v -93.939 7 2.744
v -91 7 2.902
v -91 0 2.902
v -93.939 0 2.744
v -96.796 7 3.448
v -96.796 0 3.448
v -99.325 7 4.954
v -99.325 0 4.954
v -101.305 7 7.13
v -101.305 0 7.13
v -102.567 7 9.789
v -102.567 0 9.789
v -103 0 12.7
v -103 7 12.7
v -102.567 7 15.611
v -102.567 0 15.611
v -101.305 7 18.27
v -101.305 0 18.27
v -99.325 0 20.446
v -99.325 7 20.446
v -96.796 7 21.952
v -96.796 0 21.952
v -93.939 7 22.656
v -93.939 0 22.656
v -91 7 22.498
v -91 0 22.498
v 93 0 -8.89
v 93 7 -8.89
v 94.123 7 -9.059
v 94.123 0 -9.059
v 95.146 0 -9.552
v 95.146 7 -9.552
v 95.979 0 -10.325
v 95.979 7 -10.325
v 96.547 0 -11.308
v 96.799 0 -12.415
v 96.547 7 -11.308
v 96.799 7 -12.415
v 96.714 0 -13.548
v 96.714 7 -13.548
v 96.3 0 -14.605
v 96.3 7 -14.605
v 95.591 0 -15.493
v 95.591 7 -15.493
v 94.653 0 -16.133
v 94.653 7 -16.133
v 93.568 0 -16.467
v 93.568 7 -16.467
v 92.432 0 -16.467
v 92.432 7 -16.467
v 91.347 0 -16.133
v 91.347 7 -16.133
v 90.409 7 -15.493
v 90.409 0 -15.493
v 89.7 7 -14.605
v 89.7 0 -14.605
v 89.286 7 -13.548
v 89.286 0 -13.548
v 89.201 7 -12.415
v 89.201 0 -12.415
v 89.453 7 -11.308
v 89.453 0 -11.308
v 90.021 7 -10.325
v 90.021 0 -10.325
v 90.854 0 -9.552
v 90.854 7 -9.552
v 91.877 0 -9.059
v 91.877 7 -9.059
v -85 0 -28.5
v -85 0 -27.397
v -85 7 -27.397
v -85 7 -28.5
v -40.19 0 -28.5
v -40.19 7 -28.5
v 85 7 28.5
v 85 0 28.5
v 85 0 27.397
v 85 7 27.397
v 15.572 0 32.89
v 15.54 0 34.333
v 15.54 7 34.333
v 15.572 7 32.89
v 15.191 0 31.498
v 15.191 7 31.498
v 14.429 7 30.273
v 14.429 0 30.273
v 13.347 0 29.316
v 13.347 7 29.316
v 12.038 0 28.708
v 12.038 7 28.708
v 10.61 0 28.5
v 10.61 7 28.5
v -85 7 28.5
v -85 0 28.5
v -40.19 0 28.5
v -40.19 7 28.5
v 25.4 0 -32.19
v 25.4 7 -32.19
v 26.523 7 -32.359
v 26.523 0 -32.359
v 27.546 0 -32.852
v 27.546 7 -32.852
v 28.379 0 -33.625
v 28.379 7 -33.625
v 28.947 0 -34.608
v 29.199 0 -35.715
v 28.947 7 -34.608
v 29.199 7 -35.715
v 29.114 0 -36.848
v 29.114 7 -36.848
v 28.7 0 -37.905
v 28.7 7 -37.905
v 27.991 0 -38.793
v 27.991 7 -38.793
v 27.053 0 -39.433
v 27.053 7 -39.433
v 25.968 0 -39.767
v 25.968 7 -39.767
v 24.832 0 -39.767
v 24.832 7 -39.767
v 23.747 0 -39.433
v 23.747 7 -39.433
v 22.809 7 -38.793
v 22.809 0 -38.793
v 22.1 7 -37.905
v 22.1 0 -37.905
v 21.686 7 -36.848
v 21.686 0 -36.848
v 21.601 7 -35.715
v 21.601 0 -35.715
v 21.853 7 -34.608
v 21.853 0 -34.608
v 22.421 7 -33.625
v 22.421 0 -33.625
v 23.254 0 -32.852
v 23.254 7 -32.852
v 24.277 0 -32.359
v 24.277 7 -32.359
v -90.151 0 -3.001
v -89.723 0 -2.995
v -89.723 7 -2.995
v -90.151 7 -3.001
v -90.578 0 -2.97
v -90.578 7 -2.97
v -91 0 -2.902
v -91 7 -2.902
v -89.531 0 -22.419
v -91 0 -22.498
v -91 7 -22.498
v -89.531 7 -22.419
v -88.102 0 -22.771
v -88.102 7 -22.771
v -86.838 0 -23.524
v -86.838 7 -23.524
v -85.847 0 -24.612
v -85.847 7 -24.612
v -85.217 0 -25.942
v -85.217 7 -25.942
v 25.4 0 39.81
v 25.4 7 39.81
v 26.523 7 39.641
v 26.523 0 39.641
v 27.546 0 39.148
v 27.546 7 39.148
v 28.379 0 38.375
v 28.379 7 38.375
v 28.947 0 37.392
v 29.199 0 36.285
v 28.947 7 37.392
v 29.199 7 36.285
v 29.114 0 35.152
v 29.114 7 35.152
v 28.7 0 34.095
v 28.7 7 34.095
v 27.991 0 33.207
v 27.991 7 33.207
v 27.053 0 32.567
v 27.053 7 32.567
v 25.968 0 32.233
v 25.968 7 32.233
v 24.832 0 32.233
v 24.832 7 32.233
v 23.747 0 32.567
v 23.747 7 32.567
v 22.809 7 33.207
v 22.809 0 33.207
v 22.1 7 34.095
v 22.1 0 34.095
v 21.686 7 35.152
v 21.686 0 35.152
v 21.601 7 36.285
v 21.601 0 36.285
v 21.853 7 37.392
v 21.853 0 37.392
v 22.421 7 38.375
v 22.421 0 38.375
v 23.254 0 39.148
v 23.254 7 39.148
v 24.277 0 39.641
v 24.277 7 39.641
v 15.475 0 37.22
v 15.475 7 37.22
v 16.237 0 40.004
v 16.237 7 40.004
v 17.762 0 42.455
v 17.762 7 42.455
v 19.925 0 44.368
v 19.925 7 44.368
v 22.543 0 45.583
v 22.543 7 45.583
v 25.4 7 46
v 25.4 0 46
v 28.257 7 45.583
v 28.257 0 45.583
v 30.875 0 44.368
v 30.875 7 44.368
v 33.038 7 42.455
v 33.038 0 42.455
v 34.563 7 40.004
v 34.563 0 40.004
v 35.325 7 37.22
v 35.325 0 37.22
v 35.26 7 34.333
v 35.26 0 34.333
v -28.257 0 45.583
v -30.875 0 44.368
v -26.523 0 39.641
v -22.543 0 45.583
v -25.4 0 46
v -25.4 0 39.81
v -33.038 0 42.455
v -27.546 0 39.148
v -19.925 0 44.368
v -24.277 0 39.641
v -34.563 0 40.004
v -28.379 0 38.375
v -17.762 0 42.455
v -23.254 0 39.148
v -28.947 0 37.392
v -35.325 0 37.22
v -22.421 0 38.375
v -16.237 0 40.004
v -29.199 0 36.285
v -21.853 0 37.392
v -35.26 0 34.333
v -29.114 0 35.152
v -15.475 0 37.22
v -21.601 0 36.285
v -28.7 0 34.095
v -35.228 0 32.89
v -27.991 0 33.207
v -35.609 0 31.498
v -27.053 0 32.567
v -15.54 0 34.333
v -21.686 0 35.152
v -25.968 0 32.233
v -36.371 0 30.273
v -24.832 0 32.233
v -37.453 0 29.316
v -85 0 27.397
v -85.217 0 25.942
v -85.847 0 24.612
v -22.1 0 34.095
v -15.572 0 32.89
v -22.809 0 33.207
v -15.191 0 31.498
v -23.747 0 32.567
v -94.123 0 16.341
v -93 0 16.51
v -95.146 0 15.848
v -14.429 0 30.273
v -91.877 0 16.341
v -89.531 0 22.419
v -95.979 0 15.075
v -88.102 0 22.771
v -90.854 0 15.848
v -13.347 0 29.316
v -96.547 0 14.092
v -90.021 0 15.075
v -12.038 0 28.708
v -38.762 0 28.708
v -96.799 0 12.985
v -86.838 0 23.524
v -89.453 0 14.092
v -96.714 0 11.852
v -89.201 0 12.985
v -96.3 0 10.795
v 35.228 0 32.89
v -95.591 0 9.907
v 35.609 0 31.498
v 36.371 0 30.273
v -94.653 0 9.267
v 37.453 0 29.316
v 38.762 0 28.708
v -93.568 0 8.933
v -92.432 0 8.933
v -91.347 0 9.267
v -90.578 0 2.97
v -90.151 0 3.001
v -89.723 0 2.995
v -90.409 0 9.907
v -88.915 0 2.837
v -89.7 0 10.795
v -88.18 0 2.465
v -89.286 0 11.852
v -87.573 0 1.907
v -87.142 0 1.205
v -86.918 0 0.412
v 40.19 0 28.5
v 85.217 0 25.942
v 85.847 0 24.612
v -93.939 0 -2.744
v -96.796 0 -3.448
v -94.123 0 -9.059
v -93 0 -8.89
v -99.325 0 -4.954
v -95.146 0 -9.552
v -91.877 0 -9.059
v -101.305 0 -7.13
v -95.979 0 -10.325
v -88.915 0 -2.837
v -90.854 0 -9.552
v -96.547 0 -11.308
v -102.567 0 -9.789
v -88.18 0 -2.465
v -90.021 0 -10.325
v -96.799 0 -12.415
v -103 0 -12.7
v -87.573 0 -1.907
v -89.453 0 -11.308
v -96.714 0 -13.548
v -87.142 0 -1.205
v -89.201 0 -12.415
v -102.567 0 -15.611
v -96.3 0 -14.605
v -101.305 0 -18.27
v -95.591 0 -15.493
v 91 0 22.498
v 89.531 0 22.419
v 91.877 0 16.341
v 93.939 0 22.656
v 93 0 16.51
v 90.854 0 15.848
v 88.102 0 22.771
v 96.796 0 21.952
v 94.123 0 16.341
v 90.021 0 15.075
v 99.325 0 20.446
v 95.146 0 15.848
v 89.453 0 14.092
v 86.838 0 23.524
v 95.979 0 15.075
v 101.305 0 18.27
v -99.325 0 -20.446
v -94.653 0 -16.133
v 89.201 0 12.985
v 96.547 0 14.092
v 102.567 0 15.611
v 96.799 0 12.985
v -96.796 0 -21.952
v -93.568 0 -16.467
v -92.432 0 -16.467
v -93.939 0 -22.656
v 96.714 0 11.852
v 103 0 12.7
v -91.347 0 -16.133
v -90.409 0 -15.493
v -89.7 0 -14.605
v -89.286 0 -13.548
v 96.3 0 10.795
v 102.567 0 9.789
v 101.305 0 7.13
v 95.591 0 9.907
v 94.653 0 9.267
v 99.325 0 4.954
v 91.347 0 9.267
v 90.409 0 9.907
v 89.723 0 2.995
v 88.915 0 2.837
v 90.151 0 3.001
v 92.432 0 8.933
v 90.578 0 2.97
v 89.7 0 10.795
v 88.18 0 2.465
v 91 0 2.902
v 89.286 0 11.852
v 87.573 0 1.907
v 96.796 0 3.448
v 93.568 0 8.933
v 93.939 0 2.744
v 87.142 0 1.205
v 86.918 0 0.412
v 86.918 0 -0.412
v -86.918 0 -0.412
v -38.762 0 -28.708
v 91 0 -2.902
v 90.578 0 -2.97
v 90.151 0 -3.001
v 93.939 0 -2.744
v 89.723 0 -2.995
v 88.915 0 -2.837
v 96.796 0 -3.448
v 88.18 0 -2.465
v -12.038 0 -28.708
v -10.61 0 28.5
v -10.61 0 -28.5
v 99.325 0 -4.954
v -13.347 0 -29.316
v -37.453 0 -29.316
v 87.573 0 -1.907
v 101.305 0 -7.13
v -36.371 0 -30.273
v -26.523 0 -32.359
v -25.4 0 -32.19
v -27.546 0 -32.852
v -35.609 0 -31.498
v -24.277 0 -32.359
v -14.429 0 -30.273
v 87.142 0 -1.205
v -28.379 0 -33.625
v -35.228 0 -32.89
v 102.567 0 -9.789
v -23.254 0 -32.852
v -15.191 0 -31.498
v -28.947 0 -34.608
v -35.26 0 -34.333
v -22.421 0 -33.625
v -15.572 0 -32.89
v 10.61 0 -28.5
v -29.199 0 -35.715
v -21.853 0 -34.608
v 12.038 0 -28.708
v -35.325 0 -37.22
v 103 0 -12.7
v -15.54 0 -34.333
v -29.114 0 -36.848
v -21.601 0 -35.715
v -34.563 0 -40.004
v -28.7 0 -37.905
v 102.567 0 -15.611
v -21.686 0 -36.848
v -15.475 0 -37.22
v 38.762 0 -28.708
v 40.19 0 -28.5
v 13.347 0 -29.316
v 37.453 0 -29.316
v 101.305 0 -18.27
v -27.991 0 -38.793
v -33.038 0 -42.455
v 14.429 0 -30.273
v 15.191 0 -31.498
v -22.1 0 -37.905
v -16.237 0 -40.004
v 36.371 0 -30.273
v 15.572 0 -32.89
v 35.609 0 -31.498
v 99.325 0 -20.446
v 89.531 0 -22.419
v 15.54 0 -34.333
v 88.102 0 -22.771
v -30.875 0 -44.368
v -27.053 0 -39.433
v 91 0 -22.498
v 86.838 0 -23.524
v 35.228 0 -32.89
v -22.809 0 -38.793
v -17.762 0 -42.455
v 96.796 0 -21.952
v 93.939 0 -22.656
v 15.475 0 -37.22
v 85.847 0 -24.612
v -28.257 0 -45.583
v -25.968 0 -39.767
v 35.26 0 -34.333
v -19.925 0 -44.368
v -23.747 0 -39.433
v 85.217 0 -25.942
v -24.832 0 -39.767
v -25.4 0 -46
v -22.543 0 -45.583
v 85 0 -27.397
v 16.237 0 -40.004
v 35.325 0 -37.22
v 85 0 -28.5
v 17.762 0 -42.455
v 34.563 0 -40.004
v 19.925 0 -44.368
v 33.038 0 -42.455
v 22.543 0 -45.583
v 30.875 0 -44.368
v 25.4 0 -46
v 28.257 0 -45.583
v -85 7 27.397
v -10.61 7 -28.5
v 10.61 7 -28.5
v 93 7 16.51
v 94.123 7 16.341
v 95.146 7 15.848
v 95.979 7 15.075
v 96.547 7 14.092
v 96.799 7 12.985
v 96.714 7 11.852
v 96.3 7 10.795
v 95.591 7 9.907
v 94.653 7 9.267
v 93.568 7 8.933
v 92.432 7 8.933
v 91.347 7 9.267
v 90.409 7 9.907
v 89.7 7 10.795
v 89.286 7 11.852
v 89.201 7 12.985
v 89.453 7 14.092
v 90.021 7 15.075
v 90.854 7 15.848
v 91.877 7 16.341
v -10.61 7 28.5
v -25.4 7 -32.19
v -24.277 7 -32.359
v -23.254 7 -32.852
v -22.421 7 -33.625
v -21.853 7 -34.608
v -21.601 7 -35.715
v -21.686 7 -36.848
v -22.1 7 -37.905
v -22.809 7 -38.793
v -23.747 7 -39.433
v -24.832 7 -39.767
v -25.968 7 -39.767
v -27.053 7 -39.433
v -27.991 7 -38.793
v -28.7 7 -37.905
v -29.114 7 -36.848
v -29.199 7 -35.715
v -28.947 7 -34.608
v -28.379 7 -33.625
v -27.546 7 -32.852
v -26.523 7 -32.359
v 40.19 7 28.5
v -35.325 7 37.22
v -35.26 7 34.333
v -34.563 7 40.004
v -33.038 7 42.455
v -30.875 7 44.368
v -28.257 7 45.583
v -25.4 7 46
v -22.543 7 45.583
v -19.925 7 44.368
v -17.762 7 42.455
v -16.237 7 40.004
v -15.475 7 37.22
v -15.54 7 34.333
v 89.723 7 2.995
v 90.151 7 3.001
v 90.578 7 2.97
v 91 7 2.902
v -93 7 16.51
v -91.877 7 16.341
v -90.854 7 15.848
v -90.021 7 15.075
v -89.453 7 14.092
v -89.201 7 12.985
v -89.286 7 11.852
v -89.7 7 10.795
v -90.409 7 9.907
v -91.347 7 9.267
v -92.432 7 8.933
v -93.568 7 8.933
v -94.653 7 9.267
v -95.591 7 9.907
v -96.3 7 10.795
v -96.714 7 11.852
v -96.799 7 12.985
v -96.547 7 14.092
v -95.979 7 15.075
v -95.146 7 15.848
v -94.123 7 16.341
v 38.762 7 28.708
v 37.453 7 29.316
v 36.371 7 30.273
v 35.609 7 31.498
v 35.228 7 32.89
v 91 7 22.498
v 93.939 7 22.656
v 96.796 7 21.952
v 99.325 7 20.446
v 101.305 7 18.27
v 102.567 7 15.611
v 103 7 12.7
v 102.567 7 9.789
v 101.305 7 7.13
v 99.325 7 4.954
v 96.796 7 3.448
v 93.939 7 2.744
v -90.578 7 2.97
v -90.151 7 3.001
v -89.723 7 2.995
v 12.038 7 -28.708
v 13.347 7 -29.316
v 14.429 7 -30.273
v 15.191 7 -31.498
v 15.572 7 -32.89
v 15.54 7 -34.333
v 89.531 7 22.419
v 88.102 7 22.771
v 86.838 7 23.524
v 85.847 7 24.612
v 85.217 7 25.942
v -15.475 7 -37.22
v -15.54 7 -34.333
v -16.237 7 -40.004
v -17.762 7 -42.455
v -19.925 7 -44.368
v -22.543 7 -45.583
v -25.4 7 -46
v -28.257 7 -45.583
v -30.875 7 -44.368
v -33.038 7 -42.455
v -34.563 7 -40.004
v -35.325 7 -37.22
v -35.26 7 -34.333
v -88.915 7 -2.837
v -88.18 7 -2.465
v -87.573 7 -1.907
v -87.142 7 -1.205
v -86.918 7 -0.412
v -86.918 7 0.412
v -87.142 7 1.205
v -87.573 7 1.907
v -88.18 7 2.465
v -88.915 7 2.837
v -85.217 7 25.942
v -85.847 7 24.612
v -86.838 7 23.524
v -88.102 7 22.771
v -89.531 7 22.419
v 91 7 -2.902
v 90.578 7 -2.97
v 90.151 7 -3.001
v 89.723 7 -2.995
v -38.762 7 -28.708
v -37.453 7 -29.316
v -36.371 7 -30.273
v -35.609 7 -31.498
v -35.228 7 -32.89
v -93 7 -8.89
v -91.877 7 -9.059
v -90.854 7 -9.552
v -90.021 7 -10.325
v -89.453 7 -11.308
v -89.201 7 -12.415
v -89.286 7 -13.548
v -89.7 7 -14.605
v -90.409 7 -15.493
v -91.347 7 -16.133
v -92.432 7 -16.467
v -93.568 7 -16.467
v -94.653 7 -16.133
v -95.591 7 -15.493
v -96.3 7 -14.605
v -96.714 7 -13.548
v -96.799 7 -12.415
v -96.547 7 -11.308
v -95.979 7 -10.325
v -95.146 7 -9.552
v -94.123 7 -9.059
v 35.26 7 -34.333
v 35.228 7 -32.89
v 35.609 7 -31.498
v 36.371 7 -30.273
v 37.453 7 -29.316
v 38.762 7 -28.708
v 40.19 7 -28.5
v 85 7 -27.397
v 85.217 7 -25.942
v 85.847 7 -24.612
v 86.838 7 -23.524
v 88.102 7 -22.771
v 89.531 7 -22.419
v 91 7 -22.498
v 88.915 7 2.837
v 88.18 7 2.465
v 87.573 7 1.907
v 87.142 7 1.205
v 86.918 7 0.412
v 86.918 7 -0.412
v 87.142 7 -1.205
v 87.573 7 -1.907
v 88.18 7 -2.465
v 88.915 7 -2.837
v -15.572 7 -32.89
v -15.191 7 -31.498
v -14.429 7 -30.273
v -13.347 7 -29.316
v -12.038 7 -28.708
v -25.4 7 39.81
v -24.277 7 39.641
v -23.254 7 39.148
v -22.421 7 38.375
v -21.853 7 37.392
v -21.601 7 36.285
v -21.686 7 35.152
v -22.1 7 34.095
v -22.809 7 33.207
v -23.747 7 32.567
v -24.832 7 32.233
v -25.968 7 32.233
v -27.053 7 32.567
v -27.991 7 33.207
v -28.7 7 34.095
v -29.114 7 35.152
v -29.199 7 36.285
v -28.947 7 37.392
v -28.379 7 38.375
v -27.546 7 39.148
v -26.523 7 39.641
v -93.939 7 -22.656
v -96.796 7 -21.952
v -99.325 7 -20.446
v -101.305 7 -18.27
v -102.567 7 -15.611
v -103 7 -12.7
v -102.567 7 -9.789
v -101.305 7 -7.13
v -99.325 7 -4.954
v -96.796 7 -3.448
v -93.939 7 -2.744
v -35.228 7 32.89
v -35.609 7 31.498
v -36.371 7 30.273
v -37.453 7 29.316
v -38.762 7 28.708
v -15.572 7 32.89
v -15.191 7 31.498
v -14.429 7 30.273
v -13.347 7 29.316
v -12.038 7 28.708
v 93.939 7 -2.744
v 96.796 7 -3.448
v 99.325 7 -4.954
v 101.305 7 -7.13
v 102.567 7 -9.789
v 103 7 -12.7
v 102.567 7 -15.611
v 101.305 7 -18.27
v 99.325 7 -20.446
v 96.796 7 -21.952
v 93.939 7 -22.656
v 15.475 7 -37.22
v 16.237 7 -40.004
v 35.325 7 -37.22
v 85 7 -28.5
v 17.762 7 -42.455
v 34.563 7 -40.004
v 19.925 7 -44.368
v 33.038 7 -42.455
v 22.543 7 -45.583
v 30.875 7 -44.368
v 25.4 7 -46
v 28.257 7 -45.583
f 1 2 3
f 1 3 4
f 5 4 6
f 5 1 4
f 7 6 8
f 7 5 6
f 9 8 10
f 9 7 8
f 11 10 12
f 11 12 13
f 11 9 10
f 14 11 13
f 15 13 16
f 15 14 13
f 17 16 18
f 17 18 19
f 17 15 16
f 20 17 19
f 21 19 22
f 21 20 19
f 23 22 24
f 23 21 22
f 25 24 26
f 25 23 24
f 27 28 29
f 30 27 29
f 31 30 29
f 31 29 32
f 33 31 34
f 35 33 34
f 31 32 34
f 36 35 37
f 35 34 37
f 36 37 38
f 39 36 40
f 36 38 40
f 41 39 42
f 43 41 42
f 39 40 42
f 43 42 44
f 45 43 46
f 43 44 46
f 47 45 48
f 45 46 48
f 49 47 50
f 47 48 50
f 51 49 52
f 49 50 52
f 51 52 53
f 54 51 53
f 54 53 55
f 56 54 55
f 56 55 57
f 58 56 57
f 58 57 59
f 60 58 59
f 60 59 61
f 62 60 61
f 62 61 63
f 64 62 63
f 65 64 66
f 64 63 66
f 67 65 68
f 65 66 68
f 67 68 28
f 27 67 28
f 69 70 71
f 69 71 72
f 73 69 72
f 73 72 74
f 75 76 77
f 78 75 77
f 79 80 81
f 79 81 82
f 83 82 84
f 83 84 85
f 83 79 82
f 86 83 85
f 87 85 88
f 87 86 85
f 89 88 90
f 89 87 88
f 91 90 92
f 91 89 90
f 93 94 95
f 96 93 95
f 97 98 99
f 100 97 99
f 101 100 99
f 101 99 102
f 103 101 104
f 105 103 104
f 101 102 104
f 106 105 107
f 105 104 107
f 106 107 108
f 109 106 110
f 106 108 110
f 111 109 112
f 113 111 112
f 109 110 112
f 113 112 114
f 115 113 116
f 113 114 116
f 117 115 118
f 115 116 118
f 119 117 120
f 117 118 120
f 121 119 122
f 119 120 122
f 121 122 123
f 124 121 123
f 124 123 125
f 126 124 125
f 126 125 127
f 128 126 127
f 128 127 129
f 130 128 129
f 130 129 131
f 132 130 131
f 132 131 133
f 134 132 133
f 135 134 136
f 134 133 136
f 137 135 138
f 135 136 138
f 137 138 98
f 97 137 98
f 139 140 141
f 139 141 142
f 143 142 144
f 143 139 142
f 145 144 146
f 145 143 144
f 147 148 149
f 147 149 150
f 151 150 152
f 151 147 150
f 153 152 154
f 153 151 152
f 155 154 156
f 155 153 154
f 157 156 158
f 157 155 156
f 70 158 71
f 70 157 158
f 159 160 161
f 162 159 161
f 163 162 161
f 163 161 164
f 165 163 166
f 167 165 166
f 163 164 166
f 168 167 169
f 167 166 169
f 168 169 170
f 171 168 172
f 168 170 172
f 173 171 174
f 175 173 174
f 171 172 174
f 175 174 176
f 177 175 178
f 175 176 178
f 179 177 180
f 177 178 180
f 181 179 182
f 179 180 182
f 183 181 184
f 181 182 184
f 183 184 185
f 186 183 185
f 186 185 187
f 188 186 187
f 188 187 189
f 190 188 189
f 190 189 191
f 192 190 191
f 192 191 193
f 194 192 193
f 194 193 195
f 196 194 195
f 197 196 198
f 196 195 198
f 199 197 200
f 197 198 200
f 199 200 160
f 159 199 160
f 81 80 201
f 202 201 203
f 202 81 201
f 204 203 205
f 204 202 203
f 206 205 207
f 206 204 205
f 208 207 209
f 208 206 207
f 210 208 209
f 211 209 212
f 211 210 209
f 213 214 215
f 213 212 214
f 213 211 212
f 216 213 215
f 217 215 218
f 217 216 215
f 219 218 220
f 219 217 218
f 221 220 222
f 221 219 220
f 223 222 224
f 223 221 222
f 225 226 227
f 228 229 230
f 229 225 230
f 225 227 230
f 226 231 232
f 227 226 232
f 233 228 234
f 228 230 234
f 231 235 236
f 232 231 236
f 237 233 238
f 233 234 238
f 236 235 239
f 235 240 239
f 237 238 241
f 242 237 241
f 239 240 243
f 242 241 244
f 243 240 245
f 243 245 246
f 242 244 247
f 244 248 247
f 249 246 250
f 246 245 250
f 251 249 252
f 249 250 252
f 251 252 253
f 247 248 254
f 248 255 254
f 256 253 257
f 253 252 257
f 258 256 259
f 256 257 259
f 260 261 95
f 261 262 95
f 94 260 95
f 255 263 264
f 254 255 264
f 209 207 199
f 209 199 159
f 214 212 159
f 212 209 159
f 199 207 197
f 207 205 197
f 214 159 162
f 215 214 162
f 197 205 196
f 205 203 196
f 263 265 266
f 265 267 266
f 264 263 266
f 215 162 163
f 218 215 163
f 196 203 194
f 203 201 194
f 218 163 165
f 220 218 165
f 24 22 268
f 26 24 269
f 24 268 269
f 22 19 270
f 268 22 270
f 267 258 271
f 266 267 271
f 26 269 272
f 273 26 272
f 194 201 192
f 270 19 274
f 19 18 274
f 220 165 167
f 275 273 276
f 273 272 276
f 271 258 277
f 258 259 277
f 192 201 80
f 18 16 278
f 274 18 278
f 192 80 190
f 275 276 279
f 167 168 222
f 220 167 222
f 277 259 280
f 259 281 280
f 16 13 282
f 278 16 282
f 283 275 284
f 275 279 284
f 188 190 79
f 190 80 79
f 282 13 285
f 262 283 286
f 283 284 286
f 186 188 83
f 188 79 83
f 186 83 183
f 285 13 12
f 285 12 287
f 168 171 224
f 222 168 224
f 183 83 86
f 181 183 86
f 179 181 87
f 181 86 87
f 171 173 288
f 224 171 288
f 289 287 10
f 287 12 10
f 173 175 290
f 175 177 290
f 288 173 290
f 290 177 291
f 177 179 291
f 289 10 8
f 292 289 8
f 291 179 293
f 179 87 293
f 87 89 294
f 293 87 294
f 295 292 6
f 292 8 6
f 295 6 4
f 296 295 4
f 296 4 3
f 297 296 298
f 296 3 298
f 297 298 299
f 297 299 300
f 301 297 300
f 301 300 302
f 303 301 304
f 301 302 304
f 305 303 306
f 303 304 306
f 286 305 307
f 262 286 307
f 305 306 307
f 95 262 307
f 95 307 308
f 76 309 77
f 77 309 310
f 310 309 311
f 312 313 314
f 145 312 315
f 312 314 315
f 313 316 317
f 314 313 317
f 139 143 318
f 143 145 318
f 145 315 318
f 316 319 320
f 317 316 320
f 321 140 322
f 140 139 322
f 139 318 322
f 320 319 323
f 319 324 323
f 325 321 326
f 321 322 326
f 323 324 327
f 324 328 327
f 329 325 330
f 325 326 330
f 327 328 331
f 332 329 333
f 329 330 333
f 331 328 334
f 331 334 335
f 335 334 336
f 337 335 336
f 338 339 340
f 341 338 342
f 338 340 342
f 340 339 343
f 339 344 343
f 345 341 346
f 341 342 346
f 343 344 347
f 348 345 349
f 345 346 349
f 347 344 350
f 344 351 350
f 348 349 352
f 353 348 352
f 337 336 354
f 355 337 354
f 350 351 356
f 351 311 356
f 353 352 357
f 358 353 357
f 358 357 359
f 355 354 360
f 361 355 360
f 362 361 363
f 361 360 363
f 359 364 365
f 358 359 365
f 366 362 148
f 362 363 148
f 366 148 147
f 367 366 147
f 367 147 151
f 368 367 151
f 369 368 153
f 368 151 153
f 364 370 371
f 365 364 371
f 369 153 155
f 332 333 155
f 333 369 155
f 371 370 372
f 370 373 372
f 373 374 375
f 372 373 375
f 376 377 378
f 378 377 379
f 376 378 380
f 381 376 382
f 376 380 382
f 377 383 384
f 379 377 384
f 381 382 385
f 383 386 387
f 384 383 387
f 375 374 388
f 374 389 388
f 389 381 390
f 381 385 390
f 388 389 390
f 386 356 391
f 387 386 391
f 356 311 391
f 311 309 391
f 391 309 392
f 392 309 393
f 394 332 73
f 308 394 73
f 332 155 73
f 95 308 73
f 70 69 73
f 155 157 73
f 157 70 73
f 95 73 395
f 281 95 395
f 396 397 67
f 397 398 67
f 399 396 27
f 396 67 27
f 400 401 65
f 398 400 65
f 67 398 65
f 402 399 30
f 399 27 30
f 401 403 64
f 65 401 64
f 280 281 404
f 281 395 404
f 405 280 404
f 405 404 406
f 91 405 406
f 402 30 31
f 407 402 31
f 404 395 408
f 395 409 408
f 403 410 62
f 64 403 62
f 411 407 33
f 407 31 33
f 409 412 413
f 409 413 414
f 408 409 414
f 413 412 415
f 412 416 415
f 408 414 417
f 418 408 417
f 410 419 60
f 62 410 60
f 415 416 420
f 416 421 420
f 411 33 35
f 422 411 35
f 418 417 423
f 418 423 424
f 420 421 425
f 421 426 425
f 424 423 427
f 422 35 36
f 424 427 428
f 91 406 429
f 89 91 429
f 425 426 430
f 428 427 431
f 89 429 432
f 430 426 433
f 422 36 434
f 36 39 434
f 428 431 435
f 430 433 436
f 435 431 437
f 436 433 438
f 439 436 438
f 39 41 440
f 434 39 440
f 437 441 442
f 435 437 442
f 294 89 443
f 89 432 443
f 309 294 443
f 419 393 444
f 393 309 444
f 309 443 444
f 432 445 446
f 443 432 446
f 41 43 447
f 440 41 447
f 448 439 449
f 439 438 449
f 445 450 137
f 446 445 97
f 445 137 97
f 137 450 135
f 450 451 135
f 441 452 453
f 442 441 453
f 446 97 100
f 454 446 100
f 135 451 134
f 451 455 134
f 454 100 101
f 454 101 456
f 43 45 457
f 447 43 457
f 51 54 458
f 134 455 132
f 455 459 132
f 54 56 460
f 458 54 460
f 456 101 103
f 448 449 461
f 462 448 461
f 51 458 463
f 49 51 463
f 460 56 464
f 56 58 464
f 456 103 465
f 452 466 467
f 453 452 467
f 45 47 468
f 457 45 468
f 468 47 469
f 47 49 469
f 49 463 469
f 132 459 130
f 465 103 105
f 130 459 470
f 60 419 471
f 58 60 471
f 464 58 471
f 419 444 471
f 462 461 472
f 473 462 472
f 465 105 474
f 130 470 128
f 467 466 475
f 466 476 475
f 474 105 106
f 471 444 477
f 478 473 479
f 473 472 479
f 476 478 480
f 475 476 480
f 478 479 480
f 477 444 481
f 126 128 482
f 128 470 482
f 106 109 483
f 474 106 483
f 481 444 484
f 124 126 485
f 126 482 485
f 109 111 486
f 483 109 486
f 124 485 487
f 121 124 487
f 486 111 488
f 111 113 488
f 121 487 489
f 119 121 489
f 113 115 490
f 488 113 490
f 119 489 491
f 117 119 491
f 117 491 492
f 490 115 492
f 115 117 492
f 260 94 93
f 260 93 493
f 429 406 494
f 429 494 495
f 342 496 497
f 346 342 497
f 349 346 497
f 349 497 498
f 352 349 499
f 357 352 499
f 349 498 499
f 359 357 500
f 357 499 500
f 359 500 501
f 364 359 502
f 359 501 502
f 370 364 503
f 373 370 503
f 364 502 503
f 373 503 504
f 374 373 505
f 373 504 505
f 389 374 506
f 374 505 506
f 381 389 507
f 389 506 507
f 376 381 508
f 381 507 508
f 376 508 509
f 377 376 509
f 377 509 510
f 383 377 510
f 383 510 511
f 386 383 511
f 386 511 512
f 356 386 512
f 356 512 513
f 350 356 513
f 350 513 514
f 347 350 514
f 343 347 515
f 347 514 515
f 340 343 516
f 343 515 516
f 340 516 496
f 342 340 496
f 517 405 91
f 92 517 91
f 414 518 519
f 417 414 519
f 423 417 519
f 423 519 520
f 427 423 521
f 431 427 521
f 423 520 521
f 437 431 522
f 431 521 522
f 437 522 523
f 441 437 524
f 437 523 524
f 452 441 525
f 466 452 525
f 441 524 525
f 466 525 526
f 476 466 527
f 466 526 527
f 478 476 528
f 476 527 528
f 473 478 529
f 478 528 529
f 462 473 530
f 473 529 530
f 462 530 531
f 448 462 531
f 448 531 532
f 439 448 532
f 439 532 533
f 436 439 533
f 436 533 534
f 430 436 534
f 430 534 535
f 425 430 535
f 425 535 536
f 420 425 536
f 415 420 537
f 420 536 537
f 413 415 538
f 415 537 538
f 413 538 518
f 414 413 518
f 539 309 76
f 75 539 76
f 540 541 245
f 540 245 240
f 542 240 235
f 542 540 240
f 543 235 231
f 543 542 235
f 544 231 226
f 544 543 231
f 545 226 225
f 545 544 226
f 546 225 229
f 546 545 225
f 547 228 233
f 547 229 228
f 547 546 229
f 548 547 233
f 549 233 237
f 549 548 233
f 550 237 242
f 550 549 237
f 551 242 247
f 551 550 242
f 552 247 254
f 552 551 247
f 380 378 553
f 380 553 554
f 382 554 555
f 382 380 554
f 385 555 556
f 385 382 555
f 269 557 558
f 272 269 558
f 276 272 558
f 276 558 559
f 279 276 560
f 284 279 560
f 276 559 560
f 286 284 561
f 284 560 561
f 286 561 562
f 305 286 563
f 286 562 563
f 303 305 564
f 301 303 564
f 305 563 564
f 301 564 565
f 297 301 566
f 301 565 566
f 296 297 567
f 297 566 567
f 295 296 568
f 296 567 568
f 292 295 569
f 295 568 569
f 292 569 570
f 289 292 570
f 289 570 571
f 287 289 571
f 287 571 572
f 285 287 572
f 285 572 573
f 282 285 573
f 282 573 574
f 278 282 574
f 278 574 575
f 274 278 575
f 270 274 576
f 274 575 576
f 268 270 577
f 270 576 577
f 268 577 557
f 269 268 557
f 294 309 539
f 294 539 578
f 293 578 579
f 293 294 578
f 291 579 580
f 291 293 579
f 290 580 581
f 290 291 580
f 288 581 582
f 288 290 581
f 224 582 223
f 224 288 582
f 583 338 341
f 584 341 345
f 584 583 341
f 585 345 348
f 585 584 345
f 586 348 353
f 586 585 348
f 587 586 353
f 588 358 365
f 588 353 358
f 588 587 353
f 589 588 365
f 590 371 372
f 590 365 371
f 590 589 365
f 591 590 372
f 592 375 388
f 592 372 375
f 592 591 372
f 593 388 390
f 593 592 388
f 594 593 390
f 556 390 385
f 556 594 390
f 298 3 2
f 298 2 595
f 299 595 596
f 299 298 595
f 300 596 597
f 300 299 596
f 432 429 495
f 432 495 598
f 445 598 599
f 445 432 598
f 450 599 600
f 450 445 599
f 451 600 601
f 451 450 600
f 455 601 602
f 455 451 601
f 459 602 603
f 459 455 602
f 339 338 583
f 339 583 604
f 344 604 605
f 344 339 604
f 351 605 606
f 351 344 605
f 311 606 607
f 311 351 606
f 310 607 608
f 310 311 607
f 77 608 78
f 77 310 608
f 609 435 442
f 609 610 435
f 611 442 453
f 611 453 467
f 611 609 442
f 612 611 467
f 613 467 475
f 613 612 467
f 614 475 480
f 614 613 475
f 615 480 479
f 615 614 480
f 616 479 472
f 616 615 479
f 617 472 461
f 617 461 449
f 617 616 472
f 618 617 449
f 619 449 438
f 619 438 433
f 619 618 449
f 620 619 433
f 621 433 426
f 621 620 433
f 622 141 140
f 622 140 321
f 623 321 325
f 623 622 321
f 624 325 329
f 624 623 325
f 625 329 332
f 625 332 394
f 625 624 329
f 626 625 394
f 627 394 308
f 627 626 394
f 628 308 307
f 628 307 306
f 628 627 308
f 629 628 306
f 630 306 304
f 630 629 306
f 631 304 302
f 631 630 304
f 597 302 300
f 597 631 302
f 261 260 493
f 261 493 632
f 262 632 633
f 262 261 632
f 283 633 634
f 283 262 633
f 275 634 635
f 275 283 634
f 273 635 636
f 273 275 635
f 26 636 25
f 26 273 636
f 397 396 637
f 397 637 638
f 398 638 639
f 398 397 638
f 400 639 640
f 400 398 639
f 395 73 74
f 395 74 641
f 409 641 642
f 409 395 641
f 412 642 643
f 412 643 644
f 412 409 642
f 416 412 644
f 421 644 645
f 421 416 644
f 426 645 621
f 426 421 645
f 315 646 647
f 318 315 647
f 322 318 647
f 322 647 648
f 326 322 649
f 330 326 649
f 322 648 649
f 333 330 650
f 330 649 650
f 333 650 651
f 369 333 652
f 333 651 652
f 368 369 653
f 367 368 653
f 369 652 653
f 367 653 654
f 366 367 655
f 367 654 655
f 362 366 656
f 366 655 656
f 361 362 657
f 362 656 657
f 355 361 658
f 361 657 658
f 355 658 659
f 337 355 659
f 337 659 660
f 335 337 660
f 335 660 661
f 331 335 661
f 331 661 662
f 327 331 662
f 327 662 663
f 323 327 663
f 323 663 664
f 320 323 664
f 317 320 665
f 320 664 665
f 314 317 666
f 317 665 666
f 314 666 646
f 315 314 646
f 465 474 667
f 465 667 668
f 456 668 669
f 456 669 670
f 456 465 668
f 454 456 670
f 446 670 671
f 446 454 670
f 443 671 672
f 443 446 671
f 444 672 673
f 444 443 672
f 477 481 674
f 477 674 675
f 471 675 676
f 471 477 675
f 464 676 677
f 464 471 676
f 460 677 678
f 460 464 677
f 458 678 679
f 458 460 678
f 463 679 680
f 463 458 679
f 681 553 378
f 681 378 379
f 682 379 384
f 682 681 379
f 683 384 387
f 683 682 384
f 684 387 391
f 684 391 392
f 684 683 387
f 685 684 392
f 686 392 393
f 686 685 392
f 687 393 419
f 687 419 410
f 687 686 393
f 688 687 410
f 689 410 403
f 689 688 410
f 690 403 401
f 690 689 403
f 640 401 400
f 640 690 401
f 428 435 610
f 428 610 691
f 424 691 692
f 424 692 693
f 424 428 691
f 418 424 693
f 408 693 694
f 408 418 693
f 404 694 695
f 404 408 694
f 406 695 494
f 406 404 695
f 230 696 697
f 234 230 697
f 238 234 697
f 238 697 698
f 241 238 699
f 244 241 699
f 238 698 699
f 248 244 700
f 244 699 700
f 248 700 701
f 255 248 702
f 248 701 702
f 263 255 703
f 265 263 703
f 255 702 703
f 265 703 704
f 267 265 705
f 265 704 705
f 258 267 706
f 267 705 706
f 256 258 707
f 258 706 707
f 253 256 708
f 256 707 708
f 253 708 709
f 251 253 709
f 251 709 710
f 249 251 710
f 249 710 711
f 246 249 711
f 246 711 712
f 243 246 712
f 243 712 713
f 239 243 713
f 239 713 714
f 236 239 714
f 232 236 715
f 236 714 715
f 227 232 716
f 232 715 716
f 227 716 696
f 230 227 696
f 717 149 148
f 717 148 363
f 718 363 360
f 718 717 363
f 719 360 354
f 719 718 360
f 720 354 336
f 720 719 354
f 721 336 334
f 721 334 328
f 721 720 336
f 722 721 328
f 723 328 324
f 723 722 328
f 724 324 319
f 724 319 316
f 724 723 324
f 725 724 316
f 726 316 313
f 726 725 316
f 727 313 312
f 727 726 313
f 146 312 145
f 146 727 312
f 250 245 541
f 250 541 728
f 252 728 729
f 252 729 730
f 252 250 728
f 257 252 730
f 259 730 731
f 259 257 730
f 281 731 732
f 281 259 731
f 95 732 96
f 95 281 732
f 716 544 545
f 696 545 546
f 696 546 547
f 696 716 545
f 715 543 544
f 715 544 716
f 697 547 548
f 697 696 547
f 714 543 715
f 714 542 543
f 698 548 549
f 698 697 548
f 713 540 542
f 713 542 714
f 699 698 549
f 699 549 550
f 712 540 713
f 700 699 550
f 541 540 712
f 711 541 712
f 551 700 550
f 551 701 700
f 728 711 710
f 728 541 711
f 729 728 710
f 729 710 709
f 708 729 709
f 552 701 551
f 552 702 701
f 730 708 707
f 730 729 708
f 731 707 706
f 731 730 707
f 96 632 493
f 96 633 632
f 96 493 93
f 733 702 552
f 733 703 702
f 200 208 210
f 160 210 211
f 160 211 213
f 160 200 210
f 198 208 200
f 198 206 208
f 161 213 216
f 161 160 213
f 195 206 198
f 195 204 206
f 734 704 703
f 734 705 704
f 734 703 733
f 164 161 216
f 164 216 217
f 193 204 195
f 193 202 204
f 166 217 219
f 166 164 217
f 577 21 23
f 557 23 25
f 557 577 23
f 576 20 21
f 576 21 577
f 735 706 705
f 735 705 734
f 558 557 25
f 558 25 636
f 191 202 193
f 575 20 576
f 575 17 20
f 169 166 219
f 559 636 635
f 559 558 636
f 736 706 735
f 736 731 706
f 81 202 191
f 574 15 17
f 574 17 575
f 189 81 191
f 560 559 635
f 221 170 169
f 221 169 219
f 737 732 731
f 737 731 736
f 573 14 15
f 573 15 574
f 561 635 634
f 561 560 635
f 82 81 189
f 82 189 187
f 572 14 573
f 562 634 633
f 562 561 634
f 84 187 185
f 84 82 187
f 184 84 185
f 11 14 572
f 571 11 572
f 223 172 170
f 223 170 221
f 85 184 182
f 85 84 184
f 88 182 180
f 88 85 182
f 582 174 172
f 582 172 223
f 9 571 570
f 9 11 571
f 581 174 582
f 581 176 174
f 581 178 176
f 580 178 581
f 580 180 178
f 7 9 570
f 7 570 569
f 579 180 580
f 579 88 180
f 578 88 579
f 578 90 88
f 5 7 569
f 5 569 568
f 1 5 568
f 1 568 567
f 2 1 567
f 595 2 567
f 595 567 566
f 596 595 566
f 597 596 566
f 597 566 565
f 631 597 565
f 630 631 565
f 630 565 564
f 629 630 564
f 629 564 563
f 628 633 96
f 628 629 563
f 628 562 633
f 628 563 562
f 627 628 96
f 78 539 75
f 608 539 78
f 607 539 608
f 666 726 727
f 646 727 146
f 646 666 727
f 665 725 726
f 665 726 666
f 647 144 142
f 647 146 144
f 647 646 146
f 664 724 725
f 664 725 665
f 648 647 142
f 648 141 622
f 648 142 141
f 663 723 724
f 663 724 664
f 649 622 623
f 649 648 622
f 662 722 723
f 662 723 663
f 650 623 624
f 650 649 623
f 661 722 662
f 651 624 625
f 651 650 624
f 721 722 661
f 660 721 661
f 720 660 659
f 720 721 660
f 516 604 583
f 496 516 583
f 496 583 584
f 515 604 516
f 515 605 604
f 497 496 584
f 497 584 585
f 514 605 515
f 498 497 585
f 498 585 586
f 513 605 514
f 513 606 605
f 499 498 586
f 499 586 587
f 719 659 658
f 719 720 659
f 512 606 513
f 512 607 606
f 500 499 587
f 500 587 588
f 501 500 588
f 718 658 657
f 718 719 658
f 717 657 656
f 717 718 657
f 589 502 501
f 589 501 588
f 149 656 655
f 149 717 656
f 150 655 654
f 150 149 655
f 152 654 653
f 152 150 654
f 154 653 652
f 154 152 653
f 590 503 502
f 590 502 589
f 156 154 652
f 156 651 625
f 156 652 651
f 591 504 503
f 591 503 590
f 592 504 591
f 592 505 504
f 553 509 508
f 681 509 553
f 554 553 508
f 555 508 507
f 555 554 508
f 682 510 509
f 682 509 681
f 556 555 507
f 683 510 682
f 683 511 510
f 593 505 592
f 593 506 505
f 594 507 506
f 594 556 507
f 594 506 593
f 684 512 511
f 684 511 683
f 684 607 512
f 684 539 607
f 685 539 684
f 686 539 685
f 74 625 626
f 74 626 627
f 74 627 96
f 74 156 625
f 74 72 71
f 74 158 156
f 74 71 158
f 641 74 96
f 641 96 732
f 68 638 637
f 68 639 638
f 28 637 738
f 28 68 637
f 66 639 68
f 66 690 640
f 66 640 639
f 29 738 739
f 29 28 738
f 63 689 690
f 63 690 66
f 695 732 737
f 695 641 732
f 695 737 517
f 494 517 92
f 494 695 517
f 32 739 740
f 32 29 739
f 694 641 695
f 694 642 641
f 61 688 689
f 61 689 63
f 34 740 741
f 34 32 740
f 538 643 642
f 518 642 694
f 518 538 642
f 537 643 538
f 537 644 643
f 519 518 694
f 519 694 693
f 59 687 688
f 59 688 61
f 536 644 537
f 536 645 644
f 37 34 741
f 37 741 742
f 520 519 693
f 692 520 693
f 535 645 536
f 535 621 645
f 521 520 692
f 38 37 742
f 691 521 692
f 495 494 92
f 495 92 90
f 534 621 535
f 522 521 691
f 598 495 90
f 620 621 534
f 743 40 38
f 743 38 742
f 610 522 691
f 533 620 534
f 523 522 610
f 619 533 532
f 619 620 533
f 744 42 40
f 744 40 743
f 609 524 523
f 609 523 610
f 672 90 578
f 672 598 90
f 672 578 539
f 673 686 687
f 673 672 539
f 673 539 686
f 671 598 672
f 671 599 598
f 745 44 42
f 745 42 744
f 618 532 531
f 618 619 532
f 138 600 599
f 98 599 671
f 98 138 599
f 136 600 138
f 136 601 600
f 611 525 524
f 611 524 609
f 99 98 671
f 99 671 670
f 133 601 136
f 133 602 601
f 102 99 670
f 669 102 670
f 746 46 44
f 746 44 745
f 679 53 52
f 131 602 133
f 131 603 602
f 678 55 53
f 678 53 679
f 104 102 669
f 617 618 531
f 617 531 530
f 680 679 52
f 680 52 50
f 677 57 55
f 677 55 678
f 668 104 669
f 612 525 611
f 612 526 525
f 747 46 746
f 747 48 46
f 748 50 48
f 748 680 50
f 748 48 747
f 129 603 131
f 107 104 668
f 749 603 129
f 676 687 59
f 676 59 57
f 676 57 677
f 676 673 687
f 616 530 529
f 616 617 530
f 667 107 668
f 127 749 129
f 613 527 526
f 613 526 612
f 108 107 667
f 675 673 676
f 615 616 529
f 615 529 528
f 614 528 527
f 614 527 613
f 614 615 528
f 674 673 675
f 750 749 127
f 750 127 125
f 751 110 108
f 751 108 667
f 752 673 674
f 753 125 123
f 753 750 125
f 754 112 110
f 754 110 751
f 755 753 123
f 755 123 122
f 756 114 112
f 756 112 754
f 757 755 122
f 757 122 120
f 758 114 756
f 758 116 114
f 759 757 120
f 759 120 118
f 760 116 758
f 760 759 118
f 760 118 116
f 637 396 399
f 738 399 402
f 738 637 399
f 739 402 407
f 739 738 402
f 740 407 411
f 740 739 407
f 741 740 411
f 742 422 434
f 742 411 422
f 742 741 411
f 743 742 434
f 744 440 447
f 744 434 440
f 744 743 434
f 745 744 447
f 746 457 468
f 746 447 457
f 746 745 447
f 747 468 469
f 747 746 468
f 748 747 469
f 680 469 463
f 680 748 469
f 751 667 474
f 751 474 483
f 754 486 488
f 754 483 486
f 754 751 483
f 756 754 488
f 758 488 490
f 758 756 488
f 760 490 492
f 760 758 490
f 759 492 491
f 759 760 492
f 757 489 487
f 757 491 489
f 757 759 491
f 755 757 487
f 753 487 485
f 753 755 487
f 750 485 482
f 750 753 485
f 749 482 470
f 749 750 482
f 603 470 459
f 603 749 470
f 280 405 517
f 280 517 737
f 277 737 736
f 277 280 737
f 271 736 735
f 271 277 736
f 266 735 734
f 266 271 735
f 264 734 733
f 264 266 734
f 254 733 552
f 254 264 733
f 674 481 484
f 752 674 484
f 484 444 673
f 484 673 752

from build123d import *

# Parameters (mm, degrees)
SKETCH1_W           = 170
SKETCH1_H           = 57
BOSS_EXTRUDE1_DEPTH = 7
SKETCH2_R           = 10
SKETCH2_R_2         = 3.81
BOSS_EXTRUDE2_DEPTH = 7
FILLET1_R           = 5
FILLET2_R           = 3


with BuildPart() as part:
    # Sketch1 → Boss-Extrude1 (new body)
    with BuildSketch(Plane(origin=(0, 0, 0), x_dir=(1, 0, 0), z_dir=(0, 1, 0))):
        Rectangle(SKETCH1_W, SKETCH1_H)
    extrude(amount=BOSS_EXTRUDE1_DEPTH)

    # Sketch2 → Boss-Extrude2 (add)
    # profile 1 of 8: a face of its own
    with BuildSketch(Plane(origin=(0, 7, 0), x_dir=(1, 0, 0), z_dir=(0, 1, 0))):
        with Locations((-25.4, 36)):
            Circle(SKETCH2_R)
        with Locations(Location((-25.4, 36, 0), (0, 0, 270))):
            Circle(SKETCH2_R_2, mode=Mode.SUBTRACT)
    # profile 2 of 8: a face of its own
    with BuildSketch(Plane(origin=(0, 7, 0), x_dir=(1, 0, 0), z_dir=(0, 1, 0))):
        with Locations((25.4, 36)):
            Circle(SKETCH2_R)
        with Locations(Location((25.4, 36, 0), (0, 0, 270))):
            Circle(SKETCH2_R_2, mode=Mode.SUBTRACT)
    # profile 3 of 8: a face of its own
    with BuildSketch(Plane(origin=(0, 7, 0), x_dir=(1, 0, 0), z_dir=(0, 1, 0))):
        with Locations((-93, 12.7)):
            Circle(SKETCH2_R)
        with Locations(Location((-93, 12.7, 0), (0, 0, 270))):
            Circle(SKETCH2_R_2, mode=Mode.SUBTRACT)
    # profile 4 of 8: a face of its own
    with BuildSketch(Plane(origin=(0, 7, 0), x_dir=(1, 0, 0), z_dir=(0, 1, 0))):
        with Locations((-93, -12.7)):
            Circle(SKETCH2_R)
        with Locations(Location((-93, -12.7, 0), (0, 0, 270))):
            Circle(SKETCH2_R_2, mode=Mode.SUBTRACT)
    # profile 5 of 8: a face of its own
    with BuildSketch(Plane(origin=(0, 7, 0), x_dir=(1, 0, 0), z_dir=(0, 1, 0))):
        with Locations((93, -12.7)):
            Circle(SKETCH2_R)
        with Locations(Location((93, -12.7, 0), (0, 0, 270))):
            Circle(SKETCH2_R_2, mode=Mode.SUBTRACT)
    # profile 6 of 8: a face of its own
    with BuildSketch(Plane(origin=(0, 7, 0), x_dir=(1, 0, 0), z_dir=(0, 1, 0))):
        with Locations((93, 12.7)):
            Circle(SKETCH2_R)
        with Locations(Location((93, 12.7, 0), (0, 0, 270))):
            Circle(SKETCH2_R_2, mode=Mode.SUBTRACT)
    # profile 7 of 8: a face of its own
    with BuildSketch(Plane(origin=(0, 7, 0), x_dir=(1, 0, 0), z_dir=(0, 1, 0))):
        with Locations((25.4, -36)):
            Circle(SKETCH2_R)
        with Locations(Location((25.4, -36, 0), (0, 0, 270))):
            Circle(SKETCH2_R_2, mode=Mode.SUBTRACT)
    # profile 8 of 8: a face of its own
    with BuildSketch(Plane(origin=(0, 7, 0), x_dir=(1, 0, 0), z_dir=(0, 1, 0))):
        with Locations((-25.4, -36)):
            Circle(SKETCH2_R)
        with Locations(Location((-25.4, -36, 0), (0, 0, 270))):
            Circle(SKETCH2_R_2, mode=Mode.SUBTRACT)
    extrude(amount=-BOSS_EXTRUDE2_DEPTH)

    # Fillet1
    # the kernel refuses this fillet: 5 mm, written as the material it adds along each edge
    with BuildSketch(Plane(origin=(-18.785621722, 0, -28.5), x_dir=(1, 0, 0), z_dir=(0, 1, 0)), Plane(origin=(32.014378278, 0, -28.5), x_dir=(1, 0, 0), z_dir=(0, 1, 0)), Plane(origin=(18.785621722, 0, 28.5), x_dir=(-1, 0, 0), z_dir=(0, 1, 0)), Plane(origin=(-32.014378278, 0, 28.5), x_dir=(-1, 0, 0), z_dir=(0, 1, 0))) as fillet1_piece_1:
        with BuildLine():
            CenterArc((8.17582118, 5), FILLET1_R, 170.405931773, 99.594068227)
            ThreePointArc((3.245754694, 5.833333333), (2.124003991, 2.63783224), (0, 0))
            Line((0, 0), (8.17582118, 0))
        make_face()
    extrude(amount=7)
    with BuildSketch(Plane(origin=(-32.014378278, 0, -28.5), x_dir=(-1, 0, 0), z_dir=(0, 1, 0))) as fillet1_piece_2:
        with BuildLine():
            CenterArc((8.17582118, -5), FILLET1_R, 90, 99.594068227)
            ThreePointArc((3.245754694, -5.833333333), (2.124003991, -2.63783224), (0, 0))
            Line((0, 0), (8.17582118, 0))
        make_face()
    extrude(amount=7)
    with BuildSketch(Plane(origin=(18.785621722, 0, -28.5), x_dir=(-0.4862167760179408, 0, -0.8738382268582209), z_dir=(0, 1, 0)), Plane(origin=(32.014378278, 0, 28.5), x_dir=(0.4862167760179433, 0, 0.8738382268582195), z_dir=(0, 1, 0)), Plane(origin=(-18.785621722, 0, 28.5), x_dir=(0.4862167760179409, 0, 0.8738382268582208), z_dir=(0, 1, 0))) as fillet1_piece_3:
        with BuildLine():
            CenterArc((8.34441255, 4.713261203), FILLET1_R, 150.907776941, 99.594068227)
            Line((3.975221415, 7.144345083), (0, 0))
            ThreePointArc((0, 0), (3.33776502, 0.573477594), (6.67553004, 0))
        make_face()
    extrude(amount=7)
    with BuildSketch(Plane(origin=(-85, 0, -18.7), x_dir=(0, 0, -1), z_dir=(0, 1, 0)), Plane(origin=(-85, 0, 6.7), x_dir=(0, 0, -1), z_dir=(0, 1, 0)), Plane(origin=(85, 0, 18.7), x_dir=(0, 0, 1), z_dir=(0, 1, 0)), Plane(origin=(85, 0, -6.7), x_dir=(0, 0, 1), z_dir=(0, 1, 0))) as fillet1_piece_4:
        with BuildLine():
            CenterArc((8.696938457, 5), FILLET1_R, 168.463040967, 101.536959033)
            ThreePointArc((3.797958971, 6), (2.449489743, 2.651530772), (0, 0))
            Line((0, 0), (8.696938457, 0))
        make_face()
    extrude(amount=7)
    with BuildSketch(Plane(origin=(-85, 0, -6.7), x_dir=(-0.8449489742783158, 0, 0.5348469228349566), z_dir=(0, 1, 0)), Plane(origin=(-85, 0, 18.7), x_dir=(-0.844948974278316, 0, 0.5348469228349564), z_dir=(0, 1, 0)), Plane(origin=(85, 0, 6.7), x_dir=(0.8449489742783187, 0, -0.5348469228349522), z_dir=(0, 1, 0)), Plane(origin=(85, 0, -18.7), x_dir=(0.8449489742783186, 0, -0.5348469228349523), z_dir=(0, 1, 0))) as fillet1_piece_5:
        with BuildLine():
            CenterArc((8.876275643, 4.674234614), FILLET1_R, 147.666469307, 101.536959033)
            Line((4.651530772, 7.348469228), (0, 0))
            ThreePointArc((0, 0), (3.550510257, 0.651530772), (7.101020514, 0))
        make_face()
    extrude(amount=7)

    # Fillet2
    # the kernel refuses this fillet: 3 mm, written as the material it adds along each edge
    with BuildSketch(Plane(origin=(-85.416089355, 7, 0), x_dir=(-0.8209960620456767, 0, 0.5709338544047737), z_dir=(0, -1, 0)), Plane(origin=(85.416089355, 7, 0), x_dir=(0.8209960620456767, 0, -0.5709338544047737), z_dir=(0, -1, 0))) as fillet2_piece_1:
        with BuildLine():
            CenterArc((3.672553945, 2.553953029), FILLET2_R, 127.986021581, 173.658700766)
            ThreePointArc((1.826146326, 4.918435827), (0.216147897, 2.717976503), (0, 0))
            ThreePointArc((0, 0), (2.623252818, -0.743411618), (5.246505636, 0))
        make_face()
    extrude(amount=7)


solid = part.part
